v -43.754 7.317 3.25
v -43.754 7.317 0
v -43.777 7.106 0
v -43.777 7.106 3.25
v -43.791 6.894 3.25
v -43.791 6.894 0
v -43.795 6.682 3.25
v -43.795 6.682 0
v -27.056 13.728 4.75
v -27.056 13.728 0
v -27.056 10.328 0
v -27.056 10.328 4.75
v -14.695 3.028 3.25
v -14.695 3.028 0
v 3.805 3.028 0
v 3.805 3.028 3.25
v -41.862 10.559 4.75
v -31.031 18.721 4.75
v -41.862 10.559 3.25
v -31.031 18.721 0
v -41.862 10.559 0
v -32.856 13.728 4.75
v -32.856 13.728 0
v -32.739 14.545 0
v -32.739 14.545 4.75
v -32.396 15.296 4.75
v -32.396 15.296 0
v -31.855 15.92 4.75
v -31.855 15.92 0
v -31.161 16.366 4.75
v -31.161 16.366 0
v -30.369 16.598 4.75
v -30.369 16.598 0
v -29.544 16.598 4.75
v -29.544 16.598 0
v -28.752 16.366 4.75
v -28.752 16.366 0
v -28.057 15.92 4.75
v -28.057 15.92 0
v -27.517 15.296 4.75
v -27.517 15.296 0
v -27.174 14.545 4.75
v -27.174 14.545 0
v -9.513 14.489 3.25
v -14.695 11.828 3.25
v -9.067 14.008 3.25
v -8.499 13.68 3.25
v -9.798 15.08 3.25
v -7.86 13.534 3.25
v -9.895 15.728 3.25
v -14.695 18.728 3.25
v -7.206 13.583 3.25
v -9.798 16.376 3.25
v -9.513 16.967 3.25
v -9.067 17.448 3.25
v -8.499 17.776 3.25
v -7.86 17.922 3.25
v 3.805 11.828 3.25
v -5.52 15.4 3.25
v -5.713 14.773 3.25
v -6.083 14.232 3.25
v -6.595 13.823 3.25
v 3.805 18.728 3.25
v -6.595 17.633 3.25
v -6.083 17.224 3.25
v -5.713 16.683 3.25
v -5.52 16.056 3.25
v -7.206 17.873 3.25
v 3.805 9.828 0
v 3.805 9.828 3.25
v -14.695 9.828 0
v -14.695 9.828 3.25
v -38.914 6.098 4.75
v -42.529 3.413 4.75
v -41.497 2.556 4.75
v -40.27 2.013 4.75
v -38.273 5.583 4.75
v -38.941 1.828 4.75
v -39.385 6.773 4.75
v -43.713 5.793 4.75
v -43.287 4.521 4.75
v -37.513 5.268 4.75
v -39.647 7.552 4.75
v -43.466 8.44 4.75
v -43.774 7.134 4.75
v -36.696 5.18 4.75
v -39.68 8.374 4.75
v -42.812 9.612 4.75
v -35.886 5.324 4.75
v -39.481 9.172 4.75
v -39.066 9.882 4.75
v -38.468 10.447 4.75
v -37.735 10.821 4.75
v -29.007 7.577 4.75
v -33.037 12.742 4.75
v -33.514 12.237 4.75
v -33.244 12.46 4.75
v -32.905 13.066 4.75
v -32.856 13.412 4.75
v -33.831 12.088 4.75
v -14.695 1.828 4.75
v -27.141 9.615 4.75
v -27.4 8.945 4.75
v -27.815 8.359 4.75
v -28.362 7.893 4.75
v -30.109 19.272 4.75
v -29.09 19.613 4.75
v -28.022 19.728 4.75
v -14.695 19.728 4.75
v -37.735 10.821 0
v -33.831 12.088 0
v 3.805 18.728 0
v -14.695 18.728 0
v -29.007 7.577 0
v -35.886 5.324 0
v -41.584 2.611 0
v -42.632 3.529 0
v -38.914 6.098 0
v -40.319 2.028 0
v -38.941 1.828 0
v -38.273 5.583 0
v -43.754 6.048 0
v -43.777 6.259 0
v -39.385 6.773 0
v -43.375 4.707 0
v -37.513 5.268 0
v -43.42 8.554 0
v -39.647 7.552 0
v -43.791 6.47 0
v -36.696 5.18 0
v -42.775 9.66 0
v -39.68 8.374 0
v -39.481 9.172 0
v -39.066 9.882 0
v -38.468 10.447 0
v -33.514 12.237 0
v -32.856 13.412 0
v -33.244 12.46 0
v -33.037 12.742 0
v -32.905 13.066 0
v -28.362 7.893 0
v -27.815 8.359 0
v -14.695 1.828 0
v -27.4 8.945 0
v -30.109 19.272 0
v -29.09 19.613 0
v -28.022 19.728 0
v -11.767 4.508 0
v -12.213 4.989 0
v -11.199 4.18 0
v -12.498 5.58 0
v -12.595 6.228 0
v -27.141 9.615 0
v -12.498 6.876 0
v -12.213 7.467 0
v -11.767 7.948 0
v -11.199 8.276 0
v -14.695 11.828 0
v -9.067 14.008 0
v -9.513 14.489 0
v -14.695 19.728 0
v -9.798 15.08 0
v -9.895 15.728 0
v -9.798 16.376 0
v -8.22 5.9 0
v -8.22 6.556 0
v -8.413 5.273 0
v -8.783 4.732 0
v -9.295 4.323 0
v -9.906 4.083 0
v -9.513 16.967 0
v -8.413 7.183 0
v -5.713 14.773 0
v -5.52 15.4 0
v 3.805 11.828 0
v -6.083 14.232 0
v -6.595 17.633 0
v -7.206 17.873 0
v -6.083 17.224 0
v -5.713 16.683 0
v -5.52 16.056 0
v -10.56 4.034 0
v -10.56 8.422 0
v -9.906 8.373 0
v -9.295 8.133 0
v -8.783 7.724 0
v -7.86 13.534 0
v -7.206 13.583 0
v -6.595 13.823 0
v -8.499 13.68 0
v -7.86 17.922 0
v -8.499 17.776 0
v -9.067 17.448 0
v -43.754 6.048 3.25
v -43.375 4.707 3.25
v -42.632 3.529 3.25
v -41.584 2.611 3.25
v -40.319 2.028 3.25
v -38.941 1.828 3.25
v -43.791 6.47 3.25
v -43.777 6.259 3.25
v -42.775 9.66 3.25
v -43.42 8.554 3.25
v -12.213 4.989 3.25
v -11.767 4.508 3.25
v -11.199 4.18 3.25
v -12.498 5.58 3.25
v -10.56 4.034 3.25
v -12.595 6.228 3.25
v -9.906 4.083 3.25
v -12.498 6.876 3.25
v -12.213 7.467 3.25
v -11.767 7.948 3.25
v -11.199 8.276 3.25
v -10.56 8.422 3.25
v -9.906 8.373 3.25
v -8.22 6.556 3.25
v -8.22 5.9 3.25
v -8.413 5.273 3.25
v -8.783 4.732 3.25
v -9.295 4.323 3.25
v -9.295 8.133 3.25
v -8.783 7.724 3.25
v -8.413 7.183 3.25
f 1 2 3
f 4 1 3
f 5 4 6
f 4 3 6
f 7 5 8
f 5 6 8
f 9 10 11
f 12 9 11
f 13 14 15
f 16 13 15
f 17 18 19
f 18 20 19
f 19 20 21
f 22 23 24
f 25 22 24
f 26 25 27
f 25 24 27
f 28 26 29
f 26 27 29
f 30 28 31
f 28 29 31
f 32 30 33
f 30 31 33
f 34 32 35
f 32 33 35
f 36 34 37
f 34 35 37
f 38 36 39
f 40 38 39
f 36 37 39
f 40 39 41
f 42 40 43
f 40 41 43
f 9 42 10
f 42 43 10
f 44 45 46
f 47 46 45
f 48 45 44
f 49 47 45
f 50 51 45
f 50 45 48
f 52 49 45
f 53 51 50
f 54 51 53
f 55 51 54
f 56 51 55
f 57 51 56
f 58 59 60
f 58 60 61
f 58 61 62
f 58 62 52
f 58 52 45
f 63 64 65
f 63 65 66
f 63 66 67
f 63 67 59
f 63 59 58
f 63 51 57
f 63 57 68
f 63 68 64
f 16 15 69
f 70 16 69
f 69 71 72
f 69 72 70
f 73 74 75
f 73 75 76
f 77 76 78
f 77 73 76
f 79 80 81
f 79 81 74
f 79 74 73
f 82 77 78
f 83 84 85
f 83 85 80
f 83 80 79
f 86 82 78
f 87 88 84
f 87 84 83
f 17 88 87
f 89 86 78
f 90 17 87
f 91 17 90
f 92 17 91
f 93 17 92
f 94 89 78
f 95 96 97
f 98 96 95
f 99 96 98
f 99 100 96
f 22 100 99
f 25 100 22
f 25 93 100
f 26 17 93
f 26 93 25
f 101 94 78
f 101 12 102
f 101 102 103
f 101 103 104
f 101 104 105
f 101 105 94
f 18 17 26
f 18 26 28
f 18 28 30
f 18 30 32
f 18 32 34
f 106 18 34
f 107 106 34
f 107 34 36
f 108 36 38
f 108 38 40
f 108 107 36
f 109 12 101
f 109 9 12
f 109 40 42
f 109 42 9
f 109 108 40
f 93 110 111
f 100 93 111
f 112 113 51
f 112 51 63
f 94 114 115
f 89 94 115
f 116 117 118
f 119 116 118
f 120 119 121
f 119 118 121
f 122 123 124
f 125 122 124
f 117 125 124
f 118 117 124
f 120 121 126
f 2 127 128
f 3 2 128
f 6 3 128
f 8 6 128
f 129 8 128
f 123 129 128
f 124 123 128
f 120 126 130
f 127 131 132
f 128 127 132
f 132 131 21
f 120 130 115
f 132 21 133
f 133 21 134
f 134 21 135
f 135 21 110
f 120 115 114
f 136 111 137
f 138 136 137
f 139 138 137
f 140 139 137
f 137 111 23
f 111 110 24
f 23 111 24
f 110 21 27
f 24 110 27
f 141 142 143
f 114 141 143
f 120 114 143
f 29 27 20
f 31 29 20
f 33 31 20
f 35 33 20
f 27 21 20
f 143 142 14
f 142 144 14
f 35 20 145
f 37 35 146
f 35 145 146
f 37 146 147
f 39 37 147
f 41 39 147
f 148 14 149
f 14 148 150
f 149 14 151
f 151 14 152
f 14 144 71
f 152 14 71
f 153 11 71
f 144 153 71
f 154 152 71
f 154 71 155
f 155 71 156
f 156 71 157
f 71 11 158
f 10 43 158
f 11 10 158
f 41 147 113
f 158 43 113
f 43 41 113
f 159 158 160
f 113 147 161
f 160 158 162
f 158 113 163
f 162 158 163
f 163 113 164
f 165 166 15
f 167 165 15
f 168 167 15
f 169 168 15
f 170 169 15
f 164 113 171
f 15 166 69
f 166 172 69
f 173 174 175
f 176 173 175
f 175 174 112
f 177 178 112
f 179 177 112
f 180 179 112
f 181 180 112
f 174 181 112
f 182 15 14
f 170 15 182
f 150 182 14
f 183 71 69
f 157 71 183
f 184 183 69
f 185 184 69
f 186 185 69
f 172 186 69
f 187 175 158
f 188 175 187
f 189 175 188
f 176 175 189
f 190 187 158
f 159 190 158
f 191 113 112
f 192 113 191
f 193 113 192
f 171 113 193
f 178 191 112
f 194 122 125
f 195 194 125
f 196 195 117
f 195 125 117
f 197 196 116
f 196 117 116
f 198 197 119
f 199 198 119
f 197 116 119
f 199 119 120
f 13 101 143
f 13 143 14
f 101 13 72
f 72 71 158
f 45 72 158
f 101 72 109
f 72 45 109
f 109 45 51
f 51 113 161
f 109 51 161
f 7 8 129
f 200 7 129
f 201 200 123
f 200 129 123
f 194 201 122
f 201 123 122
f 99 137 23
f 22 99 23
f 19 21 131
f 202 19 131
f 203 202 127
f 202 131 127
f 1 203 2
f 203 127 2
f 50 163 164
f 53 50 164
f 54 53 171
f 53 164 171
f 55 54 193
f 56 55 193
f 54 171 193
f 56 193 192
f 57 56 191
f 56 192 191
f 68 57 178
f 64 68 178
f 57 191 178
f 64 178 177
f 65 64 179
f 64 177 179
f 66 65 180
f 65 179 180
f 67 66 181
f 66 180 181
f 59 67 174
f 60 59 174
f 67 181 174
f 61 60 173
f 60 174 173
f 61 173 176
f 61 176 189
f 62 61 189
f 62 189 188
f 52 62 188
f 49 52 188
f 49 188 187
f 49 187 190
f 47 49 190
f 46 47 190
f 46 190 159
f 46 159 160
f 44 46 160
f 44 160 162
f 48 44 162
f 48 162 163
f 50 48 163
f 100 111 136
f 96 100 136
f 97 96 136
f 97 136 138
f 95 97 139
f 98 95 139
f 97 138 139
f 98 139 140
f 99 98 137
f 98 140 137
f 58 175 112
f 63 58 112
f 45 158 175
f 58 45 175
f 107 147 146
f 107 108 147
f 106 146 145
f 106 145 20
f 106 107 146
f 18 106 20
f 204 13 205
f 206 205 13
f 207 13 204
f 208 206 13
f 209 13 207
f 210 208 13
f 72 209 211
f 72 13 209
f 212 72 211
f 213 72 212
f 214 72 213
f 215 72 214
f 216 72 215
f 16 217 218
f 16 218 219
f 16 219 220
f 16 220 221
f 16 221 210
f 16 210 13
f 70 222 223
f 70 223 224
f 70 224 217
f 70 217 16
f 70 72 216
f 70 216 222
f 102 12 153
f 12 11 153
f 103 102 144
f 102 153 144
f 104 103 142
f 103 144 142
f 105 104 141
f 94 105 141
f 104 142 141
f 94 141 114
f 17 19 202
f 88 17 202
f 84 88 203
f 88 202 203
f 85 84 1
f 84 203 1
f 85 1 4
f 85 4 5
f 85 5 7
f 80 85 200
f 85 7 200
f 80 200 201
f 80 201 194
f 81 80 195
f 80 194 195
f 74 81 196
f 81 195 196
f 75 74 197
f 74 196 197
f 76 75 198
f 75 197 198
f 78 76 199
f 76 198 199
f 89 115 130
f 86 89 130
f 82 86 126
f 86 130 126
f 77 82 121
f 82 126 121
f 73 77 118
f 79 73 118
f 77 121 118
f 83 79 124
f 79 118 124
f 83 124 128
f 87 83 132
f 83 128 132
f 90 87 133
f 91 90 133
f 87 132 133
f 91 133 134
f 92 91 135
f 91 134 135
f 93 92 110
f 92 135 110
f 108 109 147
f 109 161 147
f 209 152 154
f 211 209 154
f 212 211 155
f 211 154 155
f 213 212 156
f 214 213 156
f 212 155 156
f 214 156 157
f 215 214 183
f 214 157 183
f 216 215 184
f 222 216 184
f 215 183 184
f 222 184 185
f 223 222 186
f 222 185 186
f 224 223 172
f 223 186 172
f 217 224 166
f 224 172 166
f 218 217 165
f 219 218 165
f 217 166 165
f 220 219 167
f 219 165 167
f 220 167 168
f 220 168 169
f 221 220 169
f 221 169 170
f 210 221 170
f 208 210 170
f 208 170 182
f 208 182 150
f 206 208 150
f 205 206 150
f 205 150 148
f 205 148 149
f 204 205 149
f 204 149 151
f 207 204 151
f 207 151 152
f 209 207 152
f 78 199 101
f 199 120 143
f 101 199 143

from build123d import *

# Parameters (mm, degrees)
F0_W     = 18.5
F0_H     = 6.9
F0_H_2   = 6.8
F1_DEPTH = 3.25
F3_DEPTH = 1.5
F4_R     = 5
F6_D     = 4.4
F8_D     = 4.4


with BuildPart() as f1:
    # F0 (on Top) → F1 (new body)
    with BuildSketch(Plane.XY):
        with BuildLine():
            Line((-14.6952698517, 19.7279642442), (-29.6952698517, 19.7279642442))
            Line((-29.6952698517, 19.7279642442), (-41.8622746435, 10.5594685057))
            ThreePointArc((-41.8622746435, 10.5594685057), (-43.1340644308, 9.1283890545), (-43.7536388636, 7.3168799651))
            Line((-43.7536388636, 7.3168799651), (-43.7536388636, 6.0480798558))
            ThreePointArc((-43.7536388636, 6.0480798558), (-42.1412711242, 3.0324095441), (-38.9407541854, 1.8279642442))
            Line((-38.9407541854, 1.8279642442), (-14.6952698517, 1.8279642442))
            Line((-14.6952698517, 1.8279642442), (-14.6952698517, 3.0279642442))
            Line((-14.6952698517, 3.0279642442), (-14.6952698517, 9.8279642442))
            Line((-14.6952698517, 9.8279642442), (-14.6952698517, 11.8279642442))
            Line((-14.6952698517, 11.8279642442), (-14.6952698517, 18.7279642442))
            Line((-14.6952698517, 18.7279642442), (-14.6952698517, 19.7279642442))
        make_face()
        with BuildLine():
            ThreePointArc((-35.8858862752, 5.3242355882), (-39.5438948337, 7.153269317), (-37.7352474887, 10.8214004184))
            Line((-37.7352474887, 10.8214004184), (-33.8307472386, 12.0875827919))
            ThreePointArc((-33.8307472386, 12.0875827919), (-33.1317830892, 12.5942209035), (-32.8564297306, 13.4123978931))
            Line((-32.8564297306, 13.4123978931), (-32.8562668471, 13.7279642442))
            ThreePointArc((-32.8562668471, 13.7279642442), (-29.9562668471, 16.6279642442), (-27.0562668471, 13.7279642442))
            Line((-27.0562668471, 13.7279642442), (-27.0562668471, 10.3279642442))
            ThreePointArc((-27.0562668471, 10.3279642442), (-27.5890997188, 8.6388139758), (-29.0068091948, 7.5770986937))
            Line((-29.0068091948, 7.5770986937), (-35.8858862752, 5.3242355882))
        make_face(mode=Mode.SUBTRACT)
        with Locations((-5.4452698517, 15.2779642442)):
            Rectangle(F0_W, F0_H)
        with BuildLine():
            Line((-43.7536388636, 6.0480798558), (-43.7536388636, 7.3168799651))
            ThreePointArc((-43.7536388636, 7.3168799651), (-43.784850924, 7.0003621876), (-43.7952698517, 6.6824799105))
            ThreePointArc((-43.7952698517, 6.6824799105), (-43.784850924, 6.3645976333), (-43.7536388636, 6.0480798558))
        make_face()
        with Locations((-5.4452698517, 6.4279642442)):
            Rectangle(F0_W, F0_H_2)
    extrude(amount=F1_DEPTH)

    # F2 (on face) → F3 (join)
    with BuildSketch(Plane.XY.offset(3.25)):
        with BuildLine():
            Line((-14.6952698517, 18.7279642442), (-14.6952698517, 19.7279642442))
            Line((-14.6952698517, 19.7279642442), (-29.6952698517, 19.7279642442))
            Line((-29.6952698517, 19.7279642442), (-41.8622746435, 10.5594685057))
            ThreePointArc((-41.8622746435, 10.5594685057), (-43.5444062264, 5.142119485), (-38.9407541854, 1.8279642442))
            Line((-38.9407541854, 1.8279642442), (-14.6952698517, 1.8279642442))
            Line((-14.6952698517, 1.8279642442), (-14.6952698517, 3.0279642442))
            Line((-14.6952698517, 3.0279642442), (-14.6952698517, 9.8279642442))
            Line((-14.6952698517, 9.8279642442), (-14.6952698517, 11.8279642442))
            Line((-14.6952698517, 11.8279642442), (-14.6952698517, 18.7279642442))
        make_face()
        with BuildLine():
            ThreePointArc((-27.0562668471, 10.3279642442), (-27.5890997188, 8.6388139758), (-29.0068091948, 7.5770986937))
            Line((-29.0068091948, 7.5770986937), (-35.8858862752, 5.3242355882))
            ThreePointArc((-35.8858862752, 5.3242355882), (-39.5438948337, 7.153269317), (-37.7352474887, 10.8214004184))
            Line((-37.7352474887, 10.8214004184), (-33.8307472386, 12.0875827919))
            ThreePointArc((-33.8307472386, 12.0875827919), (-33.1317830892, 12.5942209035), (-32.8564297306, 13.4123978931))
            Line((-32.8564297306, 13.4123978931), (-32.8562668471, 13.7279642442))
            ThreePointArc((-32.8562668471, 13.7279642442), (-29.9562668471, 16.6279642442), (-27.0562668471, 13.7279642442))
            Line((-27.0562668471, 13.7279642442), (-27.0562668471, 10.3279642442))
        make_face(mode=Mode.SUBTRACT)
    extrude(amount=F3_DEPTH)

    # F4
    f4_edges = [f1.edges().sort_by_distance(p)[0] for p in [
        (-29.69527, 19.727964, 2.375),
    ]]
    fillet(f4_edges, radius=F4_R)

    # F6 (through all)
    with Locations(Plane.XY.offset(3.25)):
        with Locations((-7.6952698517, 15.7279642442)):
            Hole(F6_D / 2)

    # F8 (through all)
    with Locations(Plane.XY.offset(3.25)):
        with Locations((-10.3952698517, 6.2279642442)):
            Hole(F8_D / 2)


solid = f1.part
